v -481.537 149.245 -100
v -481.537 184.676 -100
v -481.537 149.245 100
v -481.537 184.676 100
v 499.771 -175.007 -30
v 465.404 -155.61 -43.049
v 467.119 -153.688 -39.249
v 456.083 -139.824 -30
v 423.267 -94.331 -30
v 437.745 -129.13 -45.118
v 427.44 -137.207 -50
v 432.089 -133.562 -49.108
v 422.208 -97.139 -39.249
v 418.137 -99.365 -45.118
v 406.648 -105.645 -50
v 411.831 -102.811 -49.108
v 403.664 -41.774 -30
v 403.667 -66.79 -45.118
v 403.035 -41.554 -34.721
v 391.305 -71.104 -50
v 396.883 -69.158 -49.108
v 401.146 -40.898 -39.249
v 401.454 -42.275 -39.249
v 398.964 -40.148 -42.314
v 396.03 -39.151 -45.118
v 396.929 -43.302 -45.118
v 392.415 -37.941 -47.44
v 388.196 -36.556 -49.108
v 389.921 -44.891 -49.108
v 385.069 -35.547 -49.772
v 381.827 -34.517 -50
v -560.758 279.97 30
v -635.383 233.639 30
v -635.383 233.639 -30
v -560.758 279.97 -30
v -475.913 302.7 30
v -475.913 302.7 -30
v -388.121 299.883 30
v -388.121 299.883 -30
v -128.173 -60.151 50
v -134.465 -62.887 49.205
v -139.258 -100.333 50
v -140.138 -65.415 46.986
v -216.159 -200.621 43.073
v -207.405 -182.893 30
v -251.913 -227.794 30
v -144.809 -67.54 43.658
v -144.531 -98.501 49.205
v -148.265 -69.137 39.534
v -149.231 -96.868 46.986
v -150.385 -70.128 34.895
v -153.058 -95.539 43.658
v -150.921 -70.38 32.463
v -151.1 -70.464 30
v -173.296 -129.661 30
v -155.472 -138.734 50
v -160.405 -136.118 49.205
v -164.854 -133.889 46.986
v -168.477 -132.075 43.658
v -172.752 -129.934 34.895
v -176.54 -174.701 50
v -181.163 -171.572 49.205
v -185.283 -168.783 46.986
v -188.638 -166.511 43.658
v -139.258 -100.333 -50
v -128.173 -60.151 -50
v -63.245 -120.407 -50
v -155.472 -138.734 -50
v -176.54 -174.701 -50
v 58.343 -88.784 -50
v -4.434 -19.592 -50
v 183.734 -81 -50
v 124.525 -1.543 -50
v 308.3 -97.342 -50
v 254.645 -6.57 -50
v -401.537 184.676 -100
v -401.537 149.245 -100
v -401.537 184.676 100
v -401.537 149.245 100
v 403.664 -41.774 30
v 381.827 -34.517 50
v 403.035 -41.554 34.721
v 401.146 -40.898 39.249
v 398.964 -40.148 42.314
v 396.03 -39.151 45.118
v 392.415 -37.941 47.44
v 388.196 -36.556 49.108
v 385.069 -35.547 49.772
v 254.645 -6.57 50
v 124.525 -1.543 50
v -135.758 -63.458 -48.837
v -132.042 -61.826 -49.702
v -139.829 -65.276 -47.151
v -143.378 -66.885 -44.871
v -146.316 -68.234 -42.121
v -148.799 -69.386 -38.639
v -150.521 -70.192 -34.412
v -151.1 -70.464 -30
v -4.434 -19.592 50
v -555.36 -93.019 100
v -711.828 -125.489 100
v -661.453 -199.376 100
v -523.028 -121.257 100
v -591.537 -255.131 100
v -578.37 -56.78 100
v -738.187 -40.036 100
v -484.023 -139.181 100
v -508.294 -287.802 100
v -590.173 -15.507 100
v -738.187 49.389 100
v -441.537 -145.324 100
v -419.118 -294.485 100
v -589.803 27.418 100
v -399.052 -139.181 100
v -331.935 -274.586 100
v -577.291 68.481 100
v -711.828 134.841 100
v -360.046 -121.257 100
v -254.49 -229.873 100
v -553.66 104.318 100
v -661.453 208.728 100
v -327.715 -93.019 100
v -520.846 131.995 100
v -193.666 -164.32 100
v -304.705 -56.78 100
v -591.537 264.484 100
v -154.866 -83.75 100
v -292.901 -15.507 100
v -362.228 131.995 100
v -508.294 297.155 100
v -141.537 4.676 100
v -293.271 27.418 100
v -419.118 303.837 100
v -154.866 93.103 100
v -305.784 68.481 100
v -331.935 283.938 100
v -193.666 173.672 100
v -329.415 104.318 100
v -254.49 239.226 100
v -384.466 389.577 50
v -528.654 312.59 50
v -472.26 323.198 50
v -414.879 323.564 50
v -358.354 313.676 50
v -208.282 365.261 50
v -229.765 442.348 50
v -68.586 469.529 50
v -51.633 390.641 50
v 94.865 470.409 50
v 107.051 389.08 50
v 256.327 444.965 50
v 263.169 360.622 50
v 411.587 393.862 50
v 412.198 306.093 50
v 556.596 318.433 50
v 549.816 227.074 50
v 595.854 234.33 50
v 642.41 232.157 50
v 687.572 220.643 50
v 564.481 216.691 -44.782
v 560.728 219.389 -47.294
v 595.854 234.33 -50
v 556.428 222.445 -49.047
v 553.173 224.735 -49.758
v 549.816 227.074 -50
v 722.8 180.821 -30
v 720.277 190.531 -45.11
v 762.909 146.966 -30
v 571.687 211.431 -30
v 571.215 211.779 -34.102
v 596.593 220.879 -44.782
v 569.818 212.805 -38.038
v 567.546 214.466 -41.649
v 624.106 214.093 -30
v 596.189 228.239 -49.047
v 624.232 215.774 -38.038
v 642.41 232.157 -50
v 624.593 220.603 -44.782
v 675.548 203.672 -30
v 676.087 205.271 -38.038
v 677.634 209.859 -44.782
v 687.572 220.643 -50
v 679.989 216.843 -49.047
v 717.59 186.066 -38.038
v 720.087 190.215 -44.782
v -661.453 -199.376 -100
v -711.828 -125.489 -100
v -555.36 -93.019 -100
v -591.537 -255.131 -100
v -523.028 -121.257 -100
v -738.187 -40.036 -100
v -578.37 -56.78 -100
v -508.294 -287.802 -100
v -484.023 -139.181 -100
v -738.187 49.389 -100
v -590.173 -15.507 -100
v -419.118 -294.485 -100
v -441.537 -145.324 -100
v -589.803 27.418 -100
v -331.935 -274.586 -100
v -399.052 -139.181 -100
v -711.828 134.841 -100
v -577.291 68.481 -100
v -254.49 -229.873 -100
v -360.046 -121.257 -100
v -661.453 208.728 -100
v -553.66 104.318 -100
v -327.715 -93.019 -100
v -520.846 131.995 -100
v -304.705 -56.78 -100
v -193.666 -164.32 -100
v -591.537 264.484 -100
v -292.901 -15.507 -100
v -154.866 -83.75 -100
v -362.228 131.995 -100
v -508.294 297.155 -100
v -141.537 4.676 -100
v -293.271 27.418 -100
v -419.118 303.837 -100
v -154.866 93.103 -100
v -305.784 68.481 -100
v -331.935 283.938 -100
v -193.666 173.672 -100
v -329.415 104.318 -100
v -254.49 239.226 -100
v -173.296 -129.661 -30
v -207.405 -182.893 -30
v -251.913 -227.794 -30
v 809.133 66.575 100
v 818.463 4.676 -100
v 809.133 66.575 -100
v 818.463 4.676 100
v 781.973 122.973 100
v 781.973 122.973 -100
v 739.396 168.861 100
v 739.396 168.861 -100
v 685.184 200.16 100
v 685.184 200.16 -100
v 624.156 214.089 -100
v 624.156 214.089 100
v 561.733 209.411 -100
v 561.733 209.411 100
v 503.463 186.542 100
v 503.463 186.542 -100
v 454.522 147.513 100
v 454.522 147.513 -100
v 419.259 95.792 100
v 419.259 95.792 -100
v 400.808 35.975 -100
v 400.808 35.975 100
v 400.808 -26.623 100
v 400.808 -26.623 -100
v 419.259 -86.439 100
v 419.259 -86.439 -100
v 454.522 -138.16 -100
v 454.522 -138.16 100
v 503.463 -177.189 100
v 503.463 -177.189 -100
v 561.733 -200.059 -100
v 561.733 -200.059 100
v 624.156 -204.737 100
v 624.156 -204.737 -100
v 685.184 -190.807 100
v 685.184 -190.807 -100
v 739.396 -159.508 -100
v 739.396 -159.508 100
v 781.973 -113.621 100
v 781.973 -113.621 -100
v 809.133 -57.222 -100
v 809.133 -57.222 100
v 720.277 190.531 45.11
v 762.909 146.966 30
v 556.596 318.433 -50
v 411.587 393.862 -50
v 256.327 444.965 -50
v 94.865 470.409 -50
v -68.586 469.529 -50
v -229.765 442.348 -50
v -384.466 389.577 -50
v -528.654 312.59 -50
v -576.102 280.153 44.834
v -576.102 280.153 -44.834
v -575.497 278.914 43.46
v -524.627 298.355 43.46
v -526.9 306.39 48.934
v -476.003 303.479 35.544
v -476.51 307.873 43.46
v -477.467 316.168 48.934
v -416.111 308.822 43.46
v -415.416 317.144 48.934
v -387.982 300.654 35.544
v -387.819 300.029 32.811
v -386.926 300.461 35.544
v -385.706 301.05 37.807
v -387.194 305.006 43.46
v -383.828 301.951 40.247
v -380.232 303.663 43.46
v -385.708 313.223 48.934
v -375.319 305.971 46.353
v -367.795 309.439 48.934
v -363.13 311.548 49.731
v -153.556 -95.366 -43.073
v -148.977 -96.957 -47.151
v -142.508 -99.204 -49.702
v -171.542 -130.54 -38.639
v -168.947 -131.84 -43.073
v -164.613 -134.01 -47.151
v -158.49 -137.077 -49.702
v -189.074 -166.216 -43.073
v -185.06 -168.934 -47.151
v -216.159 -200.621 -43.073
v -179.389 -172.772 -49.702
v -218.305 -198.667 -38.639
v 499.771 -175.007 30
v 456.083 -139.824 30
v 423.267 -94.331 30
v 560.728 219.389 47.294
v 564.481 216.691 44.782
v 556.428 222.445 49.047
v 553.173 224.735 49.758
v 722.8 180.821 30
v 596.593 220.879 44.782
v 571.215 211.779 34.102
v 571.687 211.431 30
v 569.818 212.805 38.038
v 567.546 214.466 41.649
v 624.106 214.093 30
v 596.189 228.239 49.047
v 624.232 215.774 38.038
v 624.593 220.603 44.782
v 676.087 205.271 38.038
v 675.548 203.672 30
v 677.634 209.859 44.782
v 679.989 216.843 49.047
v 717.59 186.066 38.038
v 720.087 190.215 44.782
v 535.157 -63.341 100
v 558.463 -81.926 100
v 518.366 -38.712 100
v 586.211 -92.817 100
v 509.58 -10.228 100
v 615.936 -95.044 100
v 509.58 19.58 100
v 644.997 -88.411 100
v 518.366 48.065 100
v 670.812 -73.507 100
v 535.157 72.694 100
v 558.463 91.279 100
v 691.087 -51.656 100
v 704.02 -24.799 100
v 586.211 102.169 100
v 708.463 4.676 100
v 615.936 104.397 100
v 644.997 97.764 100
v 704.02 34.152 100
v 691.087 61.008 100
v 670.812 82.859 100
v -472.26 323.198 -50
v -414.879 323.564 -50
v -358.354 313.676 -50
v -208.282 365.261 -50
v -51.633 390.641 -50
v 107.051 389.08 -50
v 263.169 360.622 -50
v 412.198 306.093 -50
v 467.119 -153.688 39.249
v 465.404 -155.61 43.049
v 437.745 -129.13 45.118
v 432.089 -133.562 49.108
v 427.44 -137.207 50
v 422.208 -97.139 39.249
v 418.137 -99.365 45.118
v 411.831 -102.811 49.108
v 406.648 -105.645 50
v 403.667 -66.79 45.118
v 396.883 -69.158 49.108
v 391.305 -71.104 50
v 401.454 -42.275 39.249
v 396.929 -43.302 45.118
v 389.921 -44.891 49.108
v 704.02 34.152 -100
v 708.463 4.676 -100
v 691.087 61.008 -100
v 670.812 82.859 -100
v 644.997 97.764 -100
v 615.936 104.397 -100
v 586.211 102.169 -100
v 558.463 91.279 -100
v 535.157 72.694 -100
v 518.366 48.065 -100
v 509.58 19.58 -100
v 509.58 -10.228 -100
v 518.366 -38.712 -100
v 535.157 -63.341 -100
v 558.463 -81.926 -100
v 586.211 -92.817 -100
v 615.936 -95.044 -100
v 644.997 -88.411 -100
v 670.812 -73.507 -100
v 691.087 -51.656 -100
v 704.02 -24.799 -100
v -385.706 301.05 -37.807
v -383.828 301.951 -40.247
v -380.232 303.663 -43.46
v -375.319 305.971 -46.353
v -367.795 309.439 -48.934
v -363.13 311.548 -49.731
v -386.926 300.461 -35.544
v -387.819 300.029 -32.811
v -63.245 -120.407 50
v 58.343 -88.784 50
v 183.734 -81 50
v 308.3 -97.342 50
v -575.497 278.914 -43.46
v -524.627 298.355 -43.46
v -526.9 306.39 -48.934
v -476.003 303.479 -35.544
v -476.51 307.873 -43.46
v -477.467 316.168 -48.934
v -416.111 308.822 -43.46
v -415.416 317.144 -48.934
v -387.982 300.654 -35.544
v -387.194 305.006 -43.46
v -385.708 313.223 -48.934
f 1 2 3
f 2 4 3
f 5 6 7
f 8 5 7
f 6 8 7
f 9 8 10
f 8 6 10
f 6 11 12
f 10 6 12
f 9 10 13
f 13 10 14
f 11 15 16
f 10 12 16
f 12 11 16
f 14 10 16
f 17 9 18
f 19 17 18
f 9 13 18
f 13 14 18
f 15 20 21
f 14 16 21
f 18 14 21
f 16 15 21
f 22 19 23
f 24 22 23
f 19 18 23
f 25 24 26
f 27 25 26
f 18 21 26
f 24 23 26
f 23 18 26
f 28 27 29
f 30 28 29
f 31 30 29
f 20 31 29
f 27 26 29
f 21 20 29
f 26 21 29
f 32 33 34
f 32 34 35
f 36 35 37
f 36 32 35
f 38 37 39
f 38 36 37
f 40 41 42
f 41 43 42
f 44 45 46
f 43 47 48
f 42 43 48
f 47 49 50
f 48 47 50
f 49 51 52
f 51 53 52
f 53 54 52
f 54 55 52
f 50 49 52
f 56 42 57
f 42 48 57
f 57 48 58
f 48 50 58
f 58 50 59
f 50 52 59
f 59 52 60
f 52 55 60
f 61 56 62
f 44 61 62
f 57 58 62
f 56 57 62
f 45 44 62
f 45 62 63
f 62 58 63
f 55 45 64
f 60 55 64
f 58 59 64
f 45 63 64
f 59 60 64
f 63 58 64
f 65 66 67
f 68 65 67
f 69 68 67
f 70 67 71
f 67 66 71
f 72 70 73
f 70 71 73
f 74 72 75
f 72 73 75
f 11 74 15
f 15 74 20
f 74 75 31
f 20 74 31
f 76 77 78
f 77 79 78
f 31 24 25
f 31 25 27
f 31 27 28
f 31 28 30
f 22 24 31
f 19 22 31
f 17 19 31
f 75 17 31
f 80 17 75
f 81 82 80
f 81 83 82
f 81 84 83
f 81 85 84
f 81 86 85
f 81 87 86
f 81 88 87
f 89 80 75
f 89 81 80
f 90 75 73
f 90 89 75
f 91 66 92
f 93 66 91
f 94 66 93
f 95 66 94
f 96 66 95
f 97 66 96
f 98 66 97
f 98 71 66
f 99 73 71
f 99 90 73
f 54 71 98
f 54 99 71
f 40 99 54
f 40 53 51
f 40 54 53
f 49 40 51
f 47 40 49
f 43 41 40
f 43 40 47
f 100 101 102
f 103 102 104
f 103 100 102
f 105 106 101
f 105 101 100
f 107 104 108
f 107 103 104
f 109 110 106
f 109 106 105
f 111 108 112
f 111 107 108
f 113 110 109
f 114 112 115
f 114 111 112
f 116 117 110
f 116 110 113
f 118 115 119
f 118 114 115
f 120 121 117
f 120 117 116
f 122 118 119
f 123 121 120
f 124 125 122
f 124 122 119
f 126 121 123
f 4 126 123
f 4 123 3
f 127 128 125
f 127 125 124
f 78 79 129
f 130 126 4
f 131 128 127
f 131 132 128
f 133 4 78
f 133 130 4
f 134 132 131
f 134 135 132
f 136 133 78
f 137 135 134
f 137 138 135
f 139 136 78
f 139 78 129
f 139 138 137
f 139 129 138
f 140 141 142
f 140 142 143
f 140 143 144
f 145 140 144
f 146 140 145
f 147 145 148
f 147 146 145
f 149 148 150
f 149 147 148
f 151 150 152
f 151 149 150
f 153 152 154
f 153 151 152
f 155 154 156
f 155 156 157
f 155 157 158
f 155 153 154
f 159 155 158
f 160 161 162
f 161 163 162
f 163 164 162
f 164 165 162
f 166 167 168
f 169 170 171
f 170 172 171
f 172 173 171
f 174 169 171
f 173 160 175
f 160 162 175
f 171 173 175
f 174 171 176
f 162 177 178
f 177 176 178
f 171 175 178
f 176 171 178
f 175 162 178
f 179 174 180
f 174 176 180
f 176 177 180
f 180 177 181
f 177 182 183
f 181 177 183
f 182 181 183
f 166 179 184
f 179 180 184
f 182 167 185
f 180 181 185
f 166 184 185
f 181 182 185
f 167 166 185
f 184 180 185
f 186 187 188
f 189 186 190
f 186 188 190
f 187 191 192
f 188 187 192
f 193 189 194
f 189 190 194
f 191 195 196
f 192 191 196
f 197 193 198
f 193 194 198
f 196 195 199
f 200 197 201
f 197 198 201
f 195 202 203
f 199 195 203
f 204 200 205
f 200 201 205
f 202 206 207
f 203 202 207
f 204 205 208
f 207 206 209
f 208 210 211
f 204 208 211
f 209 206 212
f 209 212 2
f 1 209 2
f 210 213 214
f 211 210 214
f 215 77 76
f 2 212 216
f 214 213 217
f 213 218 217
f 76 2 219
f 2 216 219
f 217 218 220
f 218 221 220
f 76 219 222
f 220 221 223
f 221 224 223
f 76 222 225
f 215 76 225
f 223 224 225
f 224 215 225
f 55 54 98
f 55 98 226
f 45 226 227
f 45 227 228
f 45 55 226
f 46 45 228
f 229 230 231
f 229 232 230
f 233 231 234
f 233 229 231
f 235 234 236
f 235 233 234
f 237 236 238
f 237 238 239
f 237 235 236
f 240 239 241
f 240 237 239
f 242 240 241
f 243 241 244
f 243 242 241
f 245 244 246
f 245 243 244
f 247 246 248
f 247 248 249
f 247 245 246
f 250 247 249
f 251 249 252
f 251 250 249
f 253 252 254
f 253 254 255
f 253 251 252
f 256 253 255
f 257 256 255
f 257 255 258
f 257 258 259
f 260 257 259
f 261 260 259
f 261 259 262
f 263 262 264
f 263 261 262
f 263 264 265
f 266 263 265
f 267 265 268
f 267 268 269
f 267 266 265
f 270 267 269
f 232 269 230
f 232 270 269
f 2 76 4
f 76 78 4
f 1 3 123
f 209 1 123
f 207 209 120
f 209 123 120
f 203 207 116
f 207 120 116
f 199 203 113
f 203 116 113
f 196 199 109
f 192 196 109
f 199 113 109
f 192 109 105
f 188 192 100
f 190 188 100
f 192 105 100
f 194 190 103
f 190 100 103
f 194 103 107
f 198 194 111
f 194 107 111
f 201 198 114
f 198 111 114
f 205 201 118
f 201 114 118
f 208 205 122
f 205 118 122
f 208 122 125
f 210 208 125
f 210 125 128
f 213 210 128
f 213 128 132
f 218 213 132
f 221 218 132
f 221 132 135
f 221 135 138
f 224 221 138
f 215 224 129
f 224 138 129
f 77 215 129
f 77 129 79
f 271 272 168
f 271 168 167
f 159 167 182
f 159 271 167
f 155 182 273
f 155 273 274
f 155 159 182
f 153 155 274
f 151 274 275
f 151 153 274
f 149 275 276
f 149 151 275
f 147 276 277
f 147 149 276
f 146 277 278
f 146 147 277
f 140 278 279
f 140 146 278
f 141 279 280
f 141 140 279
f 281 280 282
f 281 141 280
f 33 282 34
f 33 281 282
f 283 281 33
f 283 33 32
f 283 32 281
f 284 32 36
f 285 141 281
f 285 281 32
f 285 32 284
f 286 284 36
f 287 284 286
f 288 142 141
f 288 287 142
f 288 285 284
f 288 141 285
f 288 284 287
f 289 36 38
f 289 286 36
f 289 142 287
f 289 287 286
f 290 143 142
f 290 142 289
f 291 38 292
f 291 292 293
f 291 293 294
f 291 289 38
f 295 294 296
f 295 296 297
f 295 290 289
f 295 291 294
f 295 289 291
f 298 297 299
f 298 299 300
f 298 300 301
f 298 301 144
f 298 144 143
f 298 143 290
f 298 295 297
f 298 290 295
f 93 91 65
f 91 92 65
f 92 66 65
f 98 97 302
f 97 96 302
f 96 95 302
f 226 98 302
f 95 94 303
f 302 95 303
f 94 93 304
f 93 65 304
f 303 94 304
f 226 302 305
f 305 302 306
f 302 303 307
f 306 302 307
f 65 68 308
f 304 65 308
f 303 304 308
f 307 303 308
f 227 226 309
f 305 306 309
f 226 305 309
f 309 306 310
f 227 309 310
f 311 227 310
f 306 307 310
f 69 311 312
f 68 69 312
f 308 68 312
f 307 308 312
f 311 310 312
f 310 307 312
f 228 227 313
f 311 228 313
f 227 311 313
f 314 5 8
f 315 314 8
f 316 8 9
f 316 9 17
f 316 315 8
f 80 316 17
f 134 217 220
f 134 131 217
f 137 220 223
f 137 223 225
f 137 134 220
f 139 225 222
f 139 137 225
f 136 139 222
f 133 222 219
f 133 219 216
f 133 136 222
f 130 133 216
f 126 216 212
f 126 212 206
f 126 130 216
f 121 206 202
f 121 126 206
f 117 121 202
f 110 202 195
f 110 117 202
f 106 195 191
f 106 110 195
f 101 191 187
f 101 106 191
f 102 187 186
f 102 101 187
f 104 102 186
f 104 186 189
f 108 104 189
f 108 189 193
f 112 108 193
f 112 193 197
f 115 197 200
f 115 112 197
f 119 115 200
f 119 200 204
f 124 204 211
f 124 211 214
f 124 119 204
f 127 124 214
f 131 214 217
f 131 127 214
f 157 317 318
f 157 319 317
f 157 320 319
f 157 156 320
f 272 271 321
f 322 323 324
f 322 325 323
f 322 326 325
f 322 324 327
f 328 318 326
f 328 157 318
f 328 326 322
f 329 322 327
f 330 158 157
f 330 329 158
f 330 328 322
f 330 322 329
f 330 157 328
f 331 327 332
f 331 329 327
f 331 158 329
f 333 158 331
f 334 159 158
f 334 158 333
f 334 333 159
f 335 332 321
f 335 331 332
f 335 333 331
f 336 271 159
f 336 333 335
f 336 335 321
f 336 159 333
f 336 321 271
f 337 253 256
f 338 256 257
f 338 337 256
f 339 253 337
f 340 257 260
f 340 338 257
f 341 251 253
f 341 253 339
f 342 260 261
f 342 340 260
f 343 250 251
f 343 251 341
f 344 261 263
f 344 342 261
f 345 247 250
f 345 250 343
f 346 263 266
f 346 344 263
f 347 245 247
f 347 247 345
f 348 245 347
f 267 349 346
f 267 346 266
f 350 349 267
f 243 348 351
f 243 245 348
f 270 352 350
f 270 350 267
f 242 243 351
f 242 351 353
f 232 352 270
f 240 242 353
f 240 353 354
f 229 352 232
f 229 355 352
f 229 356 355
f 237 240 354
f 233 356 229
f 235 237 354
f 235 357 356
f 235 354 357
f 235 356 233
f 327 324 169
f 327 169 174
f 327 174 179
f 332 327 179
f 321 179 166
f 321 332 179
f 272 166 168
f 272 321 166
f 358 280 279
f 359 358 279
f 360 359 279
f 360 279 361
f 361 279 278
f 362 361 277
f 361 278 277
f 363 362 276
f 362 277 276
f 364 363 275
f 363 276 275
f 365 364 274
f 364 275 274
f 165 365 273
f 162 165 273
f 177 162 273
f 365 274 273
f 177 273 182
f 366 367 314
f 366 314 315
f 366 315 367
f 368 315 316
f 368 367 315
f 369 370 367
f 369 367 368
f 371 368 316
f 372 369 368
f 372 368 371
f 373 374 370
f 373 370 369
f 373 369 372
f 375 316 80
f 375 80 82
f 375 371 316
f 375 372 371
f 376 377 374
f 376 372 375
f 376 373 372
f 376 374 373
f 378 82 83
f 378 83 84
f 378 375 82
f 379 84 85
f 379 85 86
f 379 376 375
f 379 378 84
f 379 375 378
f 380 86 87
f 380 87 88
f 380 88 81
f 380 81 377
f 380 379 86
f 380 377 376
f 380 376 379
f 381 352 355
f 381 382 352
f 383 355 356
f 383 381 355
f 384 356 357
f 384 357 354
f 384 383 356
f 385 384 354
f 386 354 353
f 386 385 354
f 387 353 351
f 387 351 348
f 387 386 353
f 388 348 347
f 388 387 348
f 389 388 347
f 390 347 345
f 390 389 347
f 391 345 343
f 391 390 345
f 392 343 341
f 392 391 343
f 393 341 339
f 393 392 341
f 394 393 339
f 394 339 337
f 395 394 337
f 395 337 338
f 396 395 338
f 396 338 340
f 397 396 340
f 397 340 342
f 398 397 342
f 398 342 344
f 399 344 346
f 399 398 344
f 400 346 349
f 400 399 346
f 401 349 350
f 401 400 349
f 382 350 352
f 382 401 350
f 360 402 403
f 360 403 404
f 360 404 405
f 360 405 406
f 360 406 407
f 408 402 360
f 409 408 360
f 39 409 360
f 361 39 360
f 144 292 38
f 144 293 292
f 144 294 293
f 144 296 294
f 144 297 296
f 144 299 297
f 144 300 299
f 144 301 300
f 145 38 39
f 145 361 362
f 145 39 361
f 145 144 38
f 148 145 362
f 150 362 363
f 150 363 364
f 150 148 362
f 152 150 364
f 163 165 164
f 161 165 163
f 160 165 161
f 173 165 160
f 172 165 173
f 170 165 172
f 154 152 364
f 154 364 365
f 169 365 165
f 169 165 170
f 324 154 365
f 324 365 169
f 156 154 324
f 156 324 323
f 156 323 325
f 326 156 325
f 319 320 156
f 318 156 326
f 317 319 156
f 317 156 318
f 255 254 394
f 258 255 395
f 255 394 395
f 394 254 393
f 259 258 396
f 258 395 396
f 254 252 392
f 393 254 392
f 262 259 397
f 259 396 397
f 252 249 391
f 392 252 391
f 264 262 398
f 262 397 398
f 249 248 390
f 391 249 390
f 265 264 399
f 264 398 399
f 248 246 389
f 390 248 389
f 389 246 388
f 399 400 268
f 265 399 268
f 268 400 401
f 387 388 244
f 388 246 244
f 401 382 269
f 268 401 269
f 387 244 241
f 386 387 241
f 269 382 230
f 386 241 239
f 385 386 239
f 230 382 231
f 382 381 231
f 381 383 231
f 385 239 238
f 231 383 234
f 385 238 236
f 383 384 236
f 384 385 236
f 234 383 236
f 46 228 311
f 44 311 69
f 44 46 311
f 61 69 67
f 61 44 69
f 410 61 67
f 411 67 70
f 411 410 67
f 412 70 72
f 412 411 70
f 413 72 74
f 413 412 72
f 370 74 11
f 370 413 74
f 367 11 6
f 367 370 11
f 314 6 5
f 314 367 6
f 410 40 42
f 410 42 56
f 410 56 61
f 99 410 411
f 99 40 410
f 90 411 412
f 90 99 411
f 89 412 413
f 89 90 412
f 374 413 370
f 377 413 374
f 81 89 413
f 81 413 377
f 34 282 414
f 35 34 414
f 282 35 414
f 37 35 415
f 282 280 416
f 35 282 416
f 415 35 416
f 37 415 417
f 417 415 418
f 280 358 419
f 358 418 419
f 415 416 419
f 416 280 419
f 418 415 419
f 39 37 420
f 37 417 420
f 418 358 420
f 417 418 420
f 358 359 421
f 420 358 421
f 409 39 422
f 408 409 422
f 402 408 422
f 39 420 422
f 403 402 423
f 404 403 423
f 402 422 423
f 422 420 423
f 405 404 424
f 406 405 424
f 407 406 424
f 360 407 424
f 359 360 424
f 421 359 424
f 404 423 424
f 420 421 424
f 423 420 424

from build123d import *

# Parameters (mm, degrees)
IZIM1_R                       = 300
Y_KSEKLIK_EKSTR_ZYON1_DEPTH   = 100
IZIM1_R_2                     = 210
IZIM1_R_3                     = 100
Y_KSEKLIK_EKSTR_ZYON1_2_DEPTH = 100
Y_KSEKLIK_EKSTR_ZYON2_DEPTH   = 50
Y_KSEKLIK_EKSTR_ZYON2_2_DEPTH = 50
RADYUS1_R                     = 20
RADYUS2_R                     = 20


with BuildPart() as part:
    # Çizim1 → Yükseklik-Ekstrüzyon1 (new, symmetric)
    with BuildSketch(Plane.XY):
        with Locations((-441.537357111, 4.676255954)):
            Circle(IZIM1_R)
        with BuildLine():
            Line((-481.537357111, 149.244578902), (-481.537357111, 184.676255954))
            Line((-481.537357111, 184.676255954), (-401.537357111, 184.676255954))
            Line((-401.537357111, 184.676255954), (-401.537357111, 149.244578902))
            ThreePointArc((-401.537357111, 149.244578902), (-441.537357111, -145.323744046), (-481.537357111, 149.244578902))
        make_face(mode=Mode.SUBTRACT)
    extrude(amount=Y_KSEKLIK_EKSTR_ZYON1_DEPTH, both=True)


with BuildPart() as body_2:
    # Çizim1 → Y_kseklik-Ekstr_zyon1 2 (new, symmetric)
    with BuildSketch(Plane.XY):
        with Locations((608.462642889, 4.676255954)):
            Circle(IZIM1_R_2)
        with Locations((608.462642889, 4.676255954)):
            Circle(IZIM1_R_3, mode=Mode.SUBTRACT)
    extrude(amount=Y_KSEKLIK_EKSTR_ZYON1_2_DEPTH, both=True)


with BuildPart() as body_3:
    # Çizim1<3> → Yükseklik-Ekstrüzyon2 (new, symmetric)
    with BuildSketch(Plane.XY):
        with BuildLine():
            ThreePointArc((-635.382602288, 233.639180731), (-519.172061184, 294.456953592), (-388.121481329, 299.882529963))
            ThreePointArc((-388.121481329, 299.882529963), (104.103777024, 389.355835491), (571.686866818, 211.431043793))
            ThreePointArc((571.686866818, 211.431043793), (675.548463161, 203.672468778), (762.908732593, 146.966119876))
            ThreePointArc((762.908732593, 146.966119876), (81.183779413, 471.349997153), (-635.382602288, 233.639180731))
        make_face()
    extrude(amount=Y_KSEKLIK_EKSTR_ZYON2_DEPTH, both=True)

    # Radyus1
    radyus1_edges = [body_3.edges().sort_by_distance(p)[0] for p in [
        (675.548463161, 203.672468778, -50),
        (675.548463161, 203.672468778, 50),
        (-519.172061184, 294.456953592, -50),
        (-519.172061184, 294.456953592, 50),
    ]]
    fillet(radyus1_edges, radius=RADYUS1_R)


with BuildPart() as body_4:
    # Çizim1<3> → Y_kseklik-Ekstr_zyon2 2 (new, symmetric)
    with BuildSketch(Plane.XY):
        with BuildLine():
            ThreePointArc((403.664287394, -41.774078669), (123.462554094, -1.596728042), (-151.099867808, -70.464044867))
            ThreePointArc((-151.099867808, -70.464044867), (-188.944531424, -157.178198453), (-251.912534947, -227.794014875))
            ThreePointArc((-251.912534947, -227.794014875), (115.560113638, -82.223624751), (499.771111256, -175.007218387))
            ThreePointArc((499.771111256, -175.007218387), (438.148977222, -118.178354409), (403.664287394, -41.774078669))
        make_face()
    extrude(amount=Y_KSEKLIK_EKSTR_ZYON2_2_DEPTH, both=True)

    # Radyus2
    radyus2_edges = [body_4.edges().sort_by_distance(p)[0] for p in [
        (438.148977222, -118.178354409, 50),
        (438.148977222, -118.178354409, -50),
        (-188.944531424, -157.178198453, -50),
        (-188.944531424, -157.178198453, 50),
    ]]
    fillet(radyus2_edges, radius=RADYUS2_R)


solid = Compound([part.part, body_2.part, body_3.part, body_4.part])
